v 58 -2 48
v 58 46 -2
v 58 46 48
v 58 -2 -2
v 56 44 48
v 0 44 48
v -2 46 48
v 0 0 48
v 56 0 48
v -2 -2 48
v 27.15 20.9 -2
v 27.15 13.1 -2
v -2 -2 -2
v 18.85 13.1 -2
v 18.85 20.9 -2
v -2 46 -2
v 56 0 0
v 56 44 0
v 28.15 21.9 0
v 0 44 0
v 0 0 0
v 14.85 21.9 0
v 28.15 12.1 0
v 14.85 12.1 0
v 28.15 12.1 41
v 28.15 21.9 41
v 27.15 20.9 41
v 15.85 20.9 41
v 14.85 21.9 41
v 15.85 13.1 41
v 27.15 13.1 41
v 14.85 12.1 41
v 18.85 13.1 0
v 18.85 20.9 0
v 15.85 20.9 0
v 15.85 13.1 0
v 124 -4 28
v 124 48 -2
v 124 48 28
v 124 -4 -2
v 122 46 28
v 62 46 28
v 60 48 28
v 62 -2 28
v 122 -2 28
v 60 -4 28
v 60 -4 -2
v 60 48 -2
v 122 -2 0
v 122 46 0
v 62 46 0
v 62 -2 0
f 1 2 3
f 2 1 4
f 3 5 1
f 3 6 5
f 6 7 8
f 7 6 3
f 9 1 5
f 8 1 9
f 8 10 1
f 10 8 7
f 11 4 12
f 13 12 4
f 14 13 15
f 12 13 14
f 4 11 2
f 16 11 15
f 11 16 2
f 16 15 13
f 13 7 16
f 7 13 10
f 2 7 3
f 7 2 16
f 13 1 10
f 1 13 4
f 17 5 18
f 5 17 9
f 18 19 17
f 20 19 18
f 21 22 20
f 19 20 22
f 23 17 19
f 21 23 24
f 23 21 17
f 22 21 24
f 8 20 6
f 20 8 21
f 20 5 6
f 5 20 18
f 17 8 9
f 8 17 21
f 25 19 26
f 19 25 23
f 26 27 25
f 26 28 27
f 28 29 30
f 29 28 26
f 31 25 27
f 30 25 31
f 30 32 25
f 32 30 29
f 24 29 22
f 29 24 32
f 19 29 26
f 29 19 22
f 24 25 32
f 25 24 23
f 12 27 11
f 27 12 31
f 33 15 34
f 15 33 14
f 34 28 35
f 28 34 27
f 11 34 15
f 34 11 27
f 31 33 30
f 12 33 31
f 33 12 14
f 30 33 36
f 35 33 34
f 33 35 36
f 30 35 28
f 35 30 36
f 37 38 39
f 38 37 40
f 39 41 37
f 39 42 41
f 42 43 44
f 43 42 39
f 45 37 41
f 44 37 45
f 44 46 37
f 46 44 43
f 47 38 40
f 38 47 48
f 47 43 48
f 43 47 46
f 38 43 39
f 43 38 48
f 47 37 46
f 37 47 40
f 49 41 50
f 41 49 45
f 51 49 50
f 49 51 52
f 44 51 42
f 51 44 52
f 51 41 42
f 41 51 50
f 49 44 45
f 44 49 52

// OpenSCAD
boundary=[56,44];
conn= [8.3,7.8,43];
postrot=[23,17]; // pozice středu otvoru

thick=2;
bottom=[thick,48];

spodek=30;

wire = 3;

magic = 0;

difference() {
	union() {
		difference() {
			translate([-thick,-thick,-bottom[0]]) cube([boundary[0]+2*thick, boundary[1]+2*thick, bottom[0]+bottom[1]]);
			cube([boundary[0],boundary[1],bottom[1]+1]);
		}
		translate([postrot[0]-conn[0]/2-1-wire,postrot[1]-conn[1]/2-1,-bottom[0]]) cube([conn[0]+2+wire,conn[1]+2,conn[2]]);
	}
	translate([postrot[0]-conn[0]/2,postrot[1]-conn[1]/2,-bottom[0]-1]) cube([conn[0],conn[1],bottom[0]+bottom[1]]);
	translate([postrot[0]-conn[0]/2-wire,postrot[1]-conn[1]/2,-bottom[0]+thick]) cube([conn[0]+wire,conn[1],bottom[0]+bottom[1]]);
}


translate([boundary[0] + 2 * thick, -2 * thick, -thick]) difference() {
	cube([boundary[0] + 4 * thick + magic, boundary[1] + 4 * thick + magic, 30]);
	translate([thick,thick,thick]) cube([boundary[0] + 2 * thick + magic, boundary[1] + 2 * thick + magic, 30]);
	
}
